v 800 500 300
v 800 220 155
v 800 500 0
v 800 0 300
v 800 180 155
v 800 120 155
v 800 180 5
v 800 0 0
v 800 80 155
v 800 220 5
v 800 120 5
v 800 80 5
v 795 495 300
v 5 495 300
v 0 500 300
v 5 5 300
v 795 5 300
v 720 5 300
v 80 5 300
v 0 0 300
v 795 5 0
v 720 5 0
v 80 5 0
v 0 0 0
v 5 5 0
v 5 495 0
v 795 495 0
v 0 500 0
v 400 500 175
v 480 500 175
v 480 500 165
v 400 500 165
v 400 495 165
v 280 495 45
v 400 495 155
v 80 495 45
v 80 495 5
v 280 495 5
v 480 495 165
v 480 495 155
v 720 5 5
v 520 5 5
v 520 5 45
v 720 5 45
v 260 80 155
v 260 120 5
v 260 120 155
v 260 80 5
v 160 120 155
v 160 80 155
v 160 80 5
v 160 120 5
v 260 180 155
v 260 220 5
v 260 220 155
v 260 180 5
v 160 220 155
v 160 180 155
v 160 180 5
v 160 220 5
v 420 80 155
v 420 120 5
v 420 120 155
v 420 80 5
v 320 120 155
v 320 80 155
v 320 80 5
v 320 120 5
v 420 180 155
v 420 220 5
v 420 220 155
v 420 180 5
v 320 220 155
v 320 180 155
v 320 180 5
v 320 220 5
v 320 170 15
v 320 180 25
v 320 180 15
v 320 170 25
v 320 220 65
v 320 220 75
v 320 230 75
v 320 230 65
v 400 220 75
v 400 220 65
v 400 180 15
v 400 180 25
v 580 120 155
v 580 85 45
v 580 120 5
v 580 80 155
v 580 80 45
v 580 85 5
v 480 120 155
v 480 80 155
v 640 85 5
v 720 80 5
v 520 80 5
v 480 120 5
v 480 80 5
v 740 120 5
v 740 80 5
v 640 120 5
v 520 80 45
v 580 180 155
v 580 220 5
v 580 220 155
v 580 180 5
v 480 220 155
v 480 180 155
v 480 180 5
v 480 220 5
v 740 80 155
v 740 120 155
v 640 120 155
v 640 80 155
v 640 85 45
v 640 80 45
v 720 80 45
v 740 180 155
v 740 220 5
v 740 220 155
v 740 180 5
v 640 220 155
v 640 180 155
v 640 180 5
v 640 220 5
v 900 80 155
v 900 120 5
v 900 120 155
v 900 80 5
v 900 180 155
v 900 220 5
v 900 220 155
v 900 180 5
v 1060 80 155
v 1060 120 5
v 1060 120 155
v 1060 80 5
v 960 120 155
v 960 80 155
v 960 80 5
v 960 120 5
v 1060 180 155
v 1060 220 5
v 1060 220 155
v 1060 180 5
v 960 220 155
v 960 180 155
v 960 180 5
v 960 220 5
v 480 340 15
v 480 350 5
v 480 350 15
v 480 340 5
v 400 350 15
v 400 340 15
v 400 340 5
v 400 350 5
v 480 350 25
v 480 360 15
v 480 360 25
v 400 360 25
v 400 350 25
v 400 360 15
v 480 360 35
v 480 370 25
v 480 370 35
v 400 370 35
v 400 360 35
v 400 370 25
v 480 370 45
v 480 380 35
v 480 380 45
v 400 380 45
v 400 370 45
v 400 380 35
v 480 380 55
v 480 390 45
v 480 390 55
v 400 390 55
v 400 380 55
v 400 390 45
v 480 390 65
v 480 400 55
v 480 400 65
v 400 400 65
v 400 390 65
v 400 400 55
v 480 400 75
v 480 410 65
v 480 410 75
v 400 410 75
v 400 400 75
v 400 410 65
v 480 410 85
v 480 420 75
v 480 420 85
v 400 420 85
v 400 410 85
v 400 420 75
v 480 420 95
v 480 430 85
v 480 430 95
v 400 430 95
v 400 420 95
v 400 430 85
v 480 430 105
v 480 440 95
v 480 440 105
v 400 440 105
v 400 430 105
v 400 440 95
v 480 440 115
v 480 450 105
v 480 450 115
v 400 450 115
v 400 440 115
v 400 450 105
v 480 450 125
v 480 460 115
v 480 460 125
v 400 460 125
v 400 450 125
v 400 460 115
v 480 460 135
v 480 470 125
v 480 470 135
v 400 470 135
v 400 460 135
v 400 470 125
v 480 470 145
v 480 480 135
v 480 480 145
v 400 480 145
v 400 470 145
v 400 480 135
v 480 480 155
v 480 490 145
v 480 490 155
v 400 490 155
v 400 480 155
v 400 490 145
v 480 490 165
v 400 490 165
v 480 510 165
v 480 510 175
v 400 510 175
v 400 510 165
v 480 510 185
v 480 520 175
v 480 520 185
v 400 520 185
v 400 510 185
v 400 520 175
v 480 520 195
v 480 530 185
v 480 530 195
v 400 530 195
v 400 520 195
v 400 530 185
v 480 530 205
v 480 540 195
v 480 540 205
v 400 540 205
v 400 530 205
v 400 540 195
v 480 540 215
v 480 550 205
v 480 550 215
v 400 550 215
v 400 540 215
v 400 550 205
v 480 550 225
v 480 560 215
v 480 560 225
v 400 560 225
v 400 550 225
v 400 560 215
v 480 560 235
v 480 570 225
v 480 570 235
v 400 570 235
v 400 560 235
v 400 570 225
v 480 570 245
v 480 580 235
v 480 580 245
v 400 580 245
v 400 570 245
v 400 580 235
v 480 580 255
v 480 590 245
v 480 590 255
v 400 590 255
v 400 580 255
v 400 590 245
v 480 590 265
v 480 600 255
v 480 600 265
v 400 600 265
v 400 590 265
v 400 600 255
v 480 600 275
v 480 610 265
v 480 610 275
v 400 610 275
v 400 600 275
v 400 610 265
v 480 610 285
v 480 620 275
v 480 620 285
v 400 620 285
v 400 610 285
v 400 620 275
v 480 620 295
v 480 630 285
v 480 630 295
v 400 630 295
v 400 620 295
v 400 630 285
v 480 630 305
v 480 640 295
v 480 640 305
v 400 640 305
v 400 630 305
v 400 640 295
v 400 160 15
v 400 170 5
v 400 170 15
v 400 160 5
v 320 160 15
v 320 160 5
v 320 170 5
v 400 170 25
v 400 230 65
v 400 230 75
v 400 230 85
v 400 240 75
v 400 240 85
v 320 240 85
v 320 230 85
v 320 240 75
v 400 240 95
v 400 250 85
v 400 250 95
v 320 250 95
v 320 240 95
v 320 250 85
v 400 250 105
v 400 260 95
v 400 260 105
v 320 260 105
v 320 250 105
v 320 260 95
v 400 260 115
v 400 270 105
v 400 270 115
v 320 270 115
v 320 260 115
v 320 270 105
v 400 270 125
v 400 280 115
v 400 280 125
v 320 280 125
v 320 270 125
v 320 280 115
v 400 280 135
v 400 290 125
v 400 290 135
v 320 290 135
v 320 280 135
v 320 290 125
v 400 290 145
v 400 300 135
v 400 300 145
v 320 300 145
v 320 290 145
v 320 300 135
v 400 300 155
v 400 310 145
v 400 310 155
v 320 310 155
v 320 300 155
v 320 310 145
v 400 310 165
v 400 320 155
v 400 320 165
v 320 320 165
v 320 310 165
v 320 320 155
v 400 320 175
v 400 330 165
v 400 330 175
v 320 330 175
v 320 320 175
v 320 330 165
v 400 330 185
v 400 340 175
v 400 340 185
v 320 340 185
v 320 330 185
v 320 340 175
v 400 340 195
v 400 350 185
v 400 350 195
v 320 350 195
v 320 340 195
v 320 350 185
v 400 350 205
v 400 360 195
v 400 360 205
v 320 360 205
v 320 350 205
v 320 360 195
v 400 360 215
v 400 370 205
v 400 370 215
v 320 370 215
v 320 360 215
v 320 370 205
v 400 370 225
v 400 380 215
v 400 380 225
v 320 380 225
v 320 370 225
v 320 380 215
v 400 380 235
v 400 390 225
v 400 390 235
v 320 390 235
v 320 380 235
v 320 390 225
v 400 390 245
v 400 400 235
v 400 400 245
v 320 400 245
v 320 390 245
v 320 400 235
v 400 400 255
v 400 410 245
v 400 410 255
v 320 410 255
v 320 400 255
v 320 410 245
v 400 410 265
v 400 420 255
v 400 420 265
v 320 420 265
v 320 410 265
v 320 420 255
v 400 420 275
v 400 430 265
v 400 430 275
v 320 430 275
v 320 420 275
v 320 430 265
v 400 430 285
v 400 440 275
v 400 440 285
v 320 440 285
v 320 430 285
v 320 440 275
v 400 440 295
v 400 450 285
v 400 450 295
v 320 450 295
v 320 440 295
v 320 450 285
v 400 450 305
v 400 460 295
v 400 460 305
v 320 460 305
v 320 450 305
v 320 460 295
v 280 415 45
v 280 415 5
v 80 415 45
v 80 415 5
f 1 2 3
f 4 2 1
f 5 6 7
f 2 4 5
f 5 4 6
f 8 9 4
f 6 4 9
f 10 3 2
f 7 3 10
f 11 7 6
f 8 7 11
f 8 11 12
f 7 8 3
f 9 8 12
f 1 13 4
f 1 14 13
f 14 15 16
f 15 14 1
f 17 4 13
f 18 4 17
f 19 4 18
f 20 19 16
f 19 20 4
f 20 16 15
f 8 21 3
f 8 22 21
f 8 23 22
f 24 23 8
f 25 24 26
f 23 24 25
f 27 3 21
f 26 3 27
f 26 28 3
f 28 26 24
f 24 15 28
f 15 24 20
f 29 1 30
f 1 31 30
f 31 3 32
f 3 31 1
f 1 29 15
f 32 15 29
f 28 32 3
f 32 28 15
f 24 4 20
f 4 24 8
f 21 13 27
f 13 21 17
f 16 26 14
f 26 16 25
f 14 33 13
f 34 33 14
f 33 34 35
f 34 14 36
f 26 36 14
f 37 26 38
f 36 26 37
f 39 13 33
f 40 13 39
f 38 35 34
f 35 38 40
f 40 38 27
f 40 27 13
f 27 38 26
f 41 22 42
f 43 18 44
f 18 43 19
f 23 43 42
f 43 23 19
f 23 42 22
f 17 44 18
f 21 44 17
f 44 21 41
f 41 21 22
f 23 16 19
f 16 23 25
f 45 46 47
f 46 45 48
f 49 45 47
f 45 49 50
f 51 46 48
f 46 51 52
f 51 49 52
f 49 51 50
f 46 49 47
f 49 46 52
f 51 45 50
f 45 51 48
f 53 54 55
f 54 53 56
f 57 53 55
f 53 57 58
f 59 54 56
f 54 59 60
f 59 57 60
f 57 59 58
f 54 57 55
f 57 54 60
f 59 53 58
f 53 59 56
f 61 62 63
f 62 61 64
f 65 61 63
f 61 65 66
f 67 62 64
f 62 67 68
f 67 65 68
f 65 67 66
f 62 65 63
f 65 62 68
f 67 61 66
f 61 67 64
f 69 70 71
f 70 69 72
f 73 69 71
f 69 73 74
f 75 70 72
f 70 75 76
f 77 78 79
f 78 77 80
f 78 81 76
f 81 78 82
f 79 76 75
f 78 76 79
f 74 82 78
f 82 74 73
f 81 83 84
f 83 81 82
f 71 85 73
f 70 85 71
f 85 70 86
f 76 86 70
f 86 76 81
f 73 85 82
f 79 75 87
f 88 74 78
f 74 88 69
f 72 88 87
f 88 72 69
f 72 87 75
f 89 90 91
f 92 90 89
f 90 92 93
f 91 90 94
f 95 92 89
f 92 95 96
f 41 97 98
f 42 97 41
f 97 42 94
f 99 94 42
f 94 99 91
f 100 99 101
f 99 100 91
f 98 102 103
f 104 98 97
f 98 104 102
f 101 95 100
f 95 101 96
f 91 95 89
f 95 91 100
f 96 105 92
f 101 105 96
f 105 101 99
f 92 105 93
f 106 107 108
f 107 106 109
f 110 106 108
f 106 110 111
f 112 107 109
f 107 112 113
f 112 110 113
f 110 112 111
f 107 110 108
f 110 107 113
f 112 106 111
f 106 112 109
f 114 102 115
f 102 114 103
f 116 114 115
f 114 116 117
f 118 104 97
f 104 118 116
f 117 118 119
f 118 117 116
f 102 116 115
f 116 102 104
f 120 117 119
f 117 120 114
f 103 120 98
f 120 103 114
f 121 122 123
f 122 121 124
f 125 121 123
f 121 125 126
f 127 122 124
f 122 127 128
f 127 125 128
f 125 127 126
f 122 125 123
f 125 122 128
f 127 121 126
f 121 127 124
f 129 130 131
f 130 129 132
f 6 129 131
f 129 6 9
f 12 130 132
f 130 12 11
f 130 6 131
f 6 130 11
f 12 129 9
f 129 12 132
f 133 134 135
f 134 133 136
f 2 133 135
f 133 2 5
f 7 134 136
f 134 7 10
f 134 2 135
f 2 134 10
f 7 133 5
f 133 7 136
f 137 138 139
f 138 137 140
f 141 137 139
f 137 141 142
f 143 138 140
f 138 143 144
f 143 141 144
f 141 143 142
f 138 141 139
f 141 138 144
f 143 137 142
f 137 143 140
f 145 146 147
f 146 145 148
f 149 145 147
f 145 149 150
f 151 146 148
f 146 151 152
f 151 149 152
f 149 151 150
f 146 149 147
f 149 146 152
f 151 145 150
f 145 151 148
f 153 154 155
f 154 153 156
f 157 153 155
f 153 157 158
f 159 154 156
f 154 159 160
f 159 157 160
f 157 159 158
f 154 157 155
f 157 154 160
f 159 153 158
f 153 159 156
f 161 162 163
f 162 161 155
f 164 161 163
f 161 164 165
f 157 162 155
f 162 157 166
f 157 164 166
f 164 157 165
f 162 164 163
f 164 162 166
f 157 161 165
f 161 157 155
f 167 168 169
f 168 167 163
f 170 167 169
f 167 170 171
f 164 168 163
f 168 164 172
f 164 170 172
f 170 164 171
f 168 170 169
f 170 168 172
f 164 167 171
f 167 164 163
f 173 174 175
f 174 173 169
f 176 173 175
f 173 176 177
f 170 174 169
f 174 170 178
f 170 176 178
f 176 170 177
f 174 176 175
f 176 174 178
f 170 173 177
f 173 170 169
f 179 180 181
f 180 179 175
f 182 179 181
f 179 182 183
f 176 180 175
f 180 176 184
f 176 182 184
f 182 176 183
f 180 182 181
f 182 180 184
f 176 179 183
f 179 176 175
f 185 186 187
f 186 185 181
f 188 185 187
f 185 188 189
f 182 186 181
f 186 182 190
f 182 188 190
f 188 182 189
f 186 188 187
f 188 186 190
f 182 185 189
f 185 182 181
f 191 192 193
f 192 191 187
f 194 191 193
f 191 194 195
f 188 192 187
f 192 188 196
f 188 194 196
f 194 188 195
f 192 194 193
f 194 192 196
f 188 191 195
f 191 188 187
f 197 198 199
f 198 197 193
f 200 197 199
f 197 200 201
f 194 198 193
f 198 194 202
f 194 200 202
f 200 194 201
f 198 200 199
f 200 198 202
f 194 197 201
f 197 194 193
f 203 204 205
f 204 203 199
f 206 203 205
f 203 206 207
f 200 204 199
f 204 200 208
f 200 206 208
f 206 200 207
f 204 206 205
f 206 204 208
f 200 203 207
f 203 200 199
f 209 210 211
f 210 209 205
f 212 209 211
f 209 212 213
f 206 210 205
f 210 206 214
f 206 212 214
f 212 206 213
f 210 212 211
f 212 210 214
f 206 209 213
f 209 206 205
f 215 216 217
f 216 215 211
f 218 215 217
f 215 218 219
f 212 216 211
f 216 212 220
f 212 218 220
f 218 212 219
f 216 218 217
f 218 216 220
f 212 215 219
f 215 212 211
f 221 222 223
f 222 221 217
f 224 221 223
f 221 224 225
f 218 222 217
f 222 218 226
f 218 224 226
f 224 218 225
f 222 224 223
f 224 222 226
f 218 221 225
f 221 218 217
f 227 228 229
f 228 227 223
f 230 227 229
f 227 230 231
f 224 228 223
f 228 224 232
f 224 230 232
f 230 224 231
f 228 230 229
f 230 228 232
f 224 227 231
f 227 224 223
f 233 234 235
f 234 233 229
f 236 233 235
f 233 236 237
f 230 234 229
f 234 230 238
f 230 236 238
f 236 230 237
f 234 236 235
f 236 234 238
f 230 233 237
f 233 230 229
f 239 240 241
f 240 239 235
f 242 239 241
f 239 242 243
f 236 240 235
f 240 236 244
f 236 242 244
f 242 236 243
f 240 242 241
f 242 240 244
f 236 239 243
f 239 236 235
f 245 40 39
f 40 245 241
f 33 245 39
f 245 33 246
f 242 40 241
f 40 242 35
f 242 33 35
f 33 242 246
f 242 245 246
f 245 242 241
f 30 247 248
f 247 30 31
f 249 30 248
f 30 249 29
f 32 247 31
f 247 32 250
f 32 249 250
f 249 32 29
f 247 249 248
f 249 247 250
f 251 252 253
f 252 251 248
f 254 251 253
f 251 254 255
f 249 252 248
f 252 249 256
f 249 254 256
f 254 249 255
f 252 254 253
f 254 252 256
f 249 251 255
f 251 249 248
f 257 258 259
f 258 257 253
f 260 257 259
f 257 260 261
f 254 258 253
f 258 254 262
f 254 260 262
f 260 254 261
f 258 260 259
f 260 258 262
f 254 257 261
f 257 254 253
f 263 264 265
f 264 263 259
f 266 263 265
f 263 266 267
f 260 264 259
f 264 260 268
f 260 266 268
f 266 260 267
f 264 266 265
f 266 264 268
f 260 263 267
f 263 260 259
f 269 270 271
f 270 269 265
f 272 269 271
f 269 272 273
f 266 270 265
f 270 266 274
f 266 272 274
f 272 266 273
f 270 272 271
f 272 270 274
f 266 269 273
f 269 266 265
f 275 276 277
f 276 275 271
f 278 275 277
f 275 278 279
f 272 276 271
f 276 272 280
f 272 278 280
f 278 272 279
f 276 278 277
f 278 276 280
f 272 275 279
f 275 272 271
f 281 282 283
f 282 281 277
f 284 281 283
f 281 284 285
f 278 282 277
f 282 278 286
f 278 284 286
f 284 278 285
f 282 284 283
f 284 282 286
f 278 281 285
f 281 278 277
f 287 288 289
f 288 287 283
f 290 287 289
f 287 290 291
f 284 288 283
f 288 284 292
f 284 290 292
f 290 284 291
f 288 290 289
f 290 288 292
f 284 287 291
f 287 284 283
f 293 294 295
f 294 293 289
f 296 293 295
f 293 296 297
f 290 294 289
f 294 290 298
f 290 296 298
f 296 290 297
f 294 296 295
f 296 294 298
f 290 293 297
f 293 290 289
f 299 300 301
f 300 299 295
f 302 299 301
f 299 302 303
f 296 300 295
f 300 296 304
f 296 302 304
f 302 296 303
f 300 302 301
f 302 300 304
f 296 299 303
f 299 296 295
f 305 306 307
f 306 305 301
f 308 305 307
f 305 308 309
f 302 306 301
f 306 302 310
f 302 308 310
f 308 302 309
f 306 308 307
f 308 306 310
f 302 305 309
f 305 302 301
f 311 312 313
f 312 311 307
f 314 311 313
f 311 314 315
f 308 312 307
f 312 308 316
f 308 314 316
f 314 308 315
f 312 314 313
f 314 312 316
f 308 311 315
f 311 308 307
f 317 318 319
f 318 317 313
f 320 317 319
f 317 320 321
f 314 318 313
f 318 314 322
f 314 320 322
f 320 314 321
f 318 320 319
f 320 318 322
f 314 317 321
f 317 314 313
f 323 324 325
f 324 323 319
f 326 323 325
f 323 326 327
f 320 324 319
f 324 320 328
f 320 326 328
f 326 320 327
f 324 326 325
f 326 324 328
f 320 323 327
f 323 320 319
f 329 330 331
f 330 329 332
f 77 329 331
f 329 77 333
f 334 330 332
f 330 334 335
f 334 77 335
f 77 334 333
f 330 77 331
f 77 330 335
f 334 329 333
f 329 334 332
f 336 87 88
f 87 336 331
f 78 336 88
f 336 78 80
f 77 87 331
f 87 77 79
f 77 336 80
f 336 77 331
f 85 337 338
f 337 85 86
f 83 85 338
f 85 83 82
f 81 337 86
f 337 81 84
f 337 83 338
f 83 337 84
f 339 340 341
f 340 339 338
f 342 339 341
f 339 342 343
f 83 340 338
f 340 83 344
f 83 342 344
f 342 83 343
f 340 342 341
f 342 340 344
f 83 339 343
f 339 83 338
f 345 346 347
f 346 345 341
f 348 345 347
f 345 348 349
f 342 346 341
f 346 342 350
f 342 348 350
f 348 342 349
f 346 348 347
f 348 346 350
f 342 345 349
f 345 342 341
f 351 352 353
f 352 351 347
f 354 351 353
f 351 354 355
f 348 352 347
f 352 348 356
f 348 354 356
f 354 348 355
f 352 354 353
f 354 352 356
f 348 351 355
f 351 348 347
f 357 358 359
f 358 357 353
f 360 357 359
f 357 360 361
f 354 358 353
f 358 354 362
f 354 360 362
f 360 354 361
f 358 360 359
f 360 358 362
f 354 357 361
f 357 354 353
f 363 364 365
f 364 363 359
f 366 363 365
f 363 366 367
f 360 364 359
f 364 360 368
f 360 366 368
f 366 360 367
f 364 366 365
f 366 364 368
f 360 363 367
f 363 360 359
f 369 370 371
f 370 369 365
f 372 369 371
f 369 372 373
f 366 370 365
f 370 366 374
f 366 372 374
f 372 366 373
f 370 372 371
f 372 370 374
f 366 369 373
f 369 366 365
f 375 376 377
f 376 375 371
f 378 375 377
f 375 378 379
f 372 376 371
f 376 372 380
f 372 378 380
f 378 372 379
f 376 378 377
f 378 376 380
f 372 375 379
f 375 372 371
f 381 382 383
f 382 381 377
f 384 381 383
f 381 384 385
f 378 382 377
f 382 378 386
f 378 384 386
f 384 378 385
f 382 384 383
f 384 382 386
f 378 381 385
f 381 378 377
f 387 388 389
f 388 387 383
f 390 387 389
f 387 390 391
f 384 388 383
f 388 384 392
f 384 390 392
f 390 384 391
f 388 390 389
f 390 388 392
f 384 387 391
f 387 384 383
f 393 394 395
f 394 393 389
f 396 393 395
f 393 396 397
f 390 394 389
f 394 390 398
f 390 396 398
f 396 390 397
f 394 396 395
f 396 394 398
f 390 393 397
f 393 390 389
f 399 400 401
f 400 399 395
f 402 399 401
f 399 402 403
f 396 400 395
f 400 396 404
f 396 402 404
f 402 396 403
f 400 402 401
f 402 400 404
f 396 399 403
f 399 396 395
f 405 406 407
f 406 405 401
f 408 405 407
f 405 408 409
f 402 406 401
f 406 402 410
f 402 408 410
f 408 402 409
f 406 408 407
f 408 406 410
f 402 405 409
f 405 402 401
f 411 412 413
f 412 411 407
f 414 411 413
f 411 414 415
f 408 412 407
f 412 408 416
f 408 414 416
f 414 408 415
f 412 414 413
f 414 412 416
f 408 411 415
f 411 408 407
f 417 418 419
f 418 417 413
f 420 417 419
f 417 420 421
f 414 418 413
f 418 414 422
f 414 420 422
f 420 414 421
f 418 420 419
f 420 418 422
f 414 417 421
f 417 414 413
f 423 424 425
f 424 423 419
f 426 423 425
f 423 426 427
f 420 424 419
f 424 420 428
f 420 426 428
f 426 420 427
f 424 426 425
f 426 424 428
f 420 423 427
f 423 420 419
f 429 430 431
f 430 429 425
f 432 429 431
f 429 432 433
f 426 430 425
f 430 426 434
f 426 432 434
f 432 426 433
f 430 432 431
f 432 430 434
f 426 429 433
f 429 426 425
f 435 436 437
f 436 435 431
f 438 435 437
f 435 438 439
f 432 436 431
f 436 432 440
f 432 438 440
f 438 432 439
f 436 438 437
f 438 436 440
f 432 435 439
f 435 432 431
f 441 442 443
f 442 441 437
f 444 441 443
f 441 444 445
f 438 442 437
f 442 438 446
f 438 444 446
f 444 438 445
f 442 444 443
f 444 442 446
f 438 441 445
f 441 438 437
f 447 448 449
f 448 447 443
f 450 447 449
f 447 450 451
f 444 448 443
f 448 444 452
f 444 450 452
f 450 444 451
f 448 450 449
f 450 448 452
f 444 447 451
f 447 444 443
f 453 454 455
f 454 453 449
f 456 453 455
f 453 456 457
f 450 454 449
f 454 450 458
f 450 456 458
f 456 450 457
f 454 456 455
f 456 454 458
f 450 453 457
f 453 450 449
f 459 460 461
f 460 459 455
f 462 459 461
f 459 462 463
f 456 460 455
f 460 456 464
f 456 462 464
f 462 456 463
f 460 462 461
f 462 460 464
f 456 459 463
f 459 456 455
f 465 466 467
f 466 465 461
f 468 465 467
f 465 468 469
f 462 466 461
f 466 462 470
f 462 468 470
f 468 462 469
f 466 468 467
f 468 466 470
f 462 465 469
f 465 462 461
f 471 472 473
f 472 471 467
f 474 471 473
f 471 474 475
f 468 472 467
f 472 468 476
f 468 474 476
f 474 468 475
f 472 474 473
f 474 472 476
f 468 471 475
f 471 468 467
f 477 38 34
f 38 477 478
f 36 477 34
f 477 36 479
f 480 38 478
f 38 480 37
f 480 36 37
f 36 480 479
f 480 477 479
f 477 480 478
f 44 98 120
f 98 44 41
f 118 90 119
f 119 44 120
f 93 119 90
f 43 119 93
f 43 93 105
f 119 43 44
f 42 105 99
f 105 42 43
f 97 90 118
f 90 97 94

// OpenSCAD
$fn = 50;

// Parameters
shelf_length = 100;
shelf_width = 40;
shelf_height = 150;
aisle_width = 60;

store_length = 800;
store_width = 500;
store_height = 300;

entrance_width = 80;
checkout_length = 200;
wall_thickness = 5;
stairs_width = 80;

// Shelf module
module shelf() {
    color("brown") {
        cube([shelf_length, shelf_width, shelf_height]);
    }
}

// Aisle module (consisting of shelves on both sides)
module aisle() {
    shelf();
    translate([0, shelf_width + aisle_width, 0])
    shelf();
}

// Entrance area
module entrance() {
    color("lightgray") {
        cube([entrance_width, wall_thickness, store_height]); // Entrance door
    }
}

// Checkout area
module checkout() {
    color("green") {
        cube([checkout_length, entrance_width, 40]); // Checkout counter
    }
}

// Staircase
module staircase() {
    for (i = [0:store_height/10 - 1]) {
        translate([0, i*10, i*10]) {
            cube([stairs_width, 10, 10]);
        }
    }
}

// Store layout
module store() {
    // Store perimeter
    color("gray") {
        difference() {
            cube([store_length, store_width, store_height]);
            translate([wall_thickness, wall_thickness, 0])
            cube([store_length - 2*wall_thickness, store_width - 2*wall_thickness, store_height]);
        }
    }

    // Entrances
    entrance();
    translate([store_length - entrance_width, 0, 0]) entrance();

    // Aisles with shelves on the first floor
    for (i = [0:5]) {
        translate([(i + 1) * (shelf_length + aisle_width), entrance_width, wall_thickness]) {
            aisle();
        }
    }

    // Checkout areas
    translate([entrance_width, store_width - entrance_width - wall_thickness, wall_thickness]) checkout();
    translate([store_length - entrance_width - checkout_length, wall_thickness, wall_thickness]) checkout();

    // Staircases
    translate([store_length/2, store_width - 2*stairs_width, wall_thickness]) staircase();
    translate([store_length/2 - stairs_width, 2*stairs_width, wall_thickness]) staircase();
}

store();
    
